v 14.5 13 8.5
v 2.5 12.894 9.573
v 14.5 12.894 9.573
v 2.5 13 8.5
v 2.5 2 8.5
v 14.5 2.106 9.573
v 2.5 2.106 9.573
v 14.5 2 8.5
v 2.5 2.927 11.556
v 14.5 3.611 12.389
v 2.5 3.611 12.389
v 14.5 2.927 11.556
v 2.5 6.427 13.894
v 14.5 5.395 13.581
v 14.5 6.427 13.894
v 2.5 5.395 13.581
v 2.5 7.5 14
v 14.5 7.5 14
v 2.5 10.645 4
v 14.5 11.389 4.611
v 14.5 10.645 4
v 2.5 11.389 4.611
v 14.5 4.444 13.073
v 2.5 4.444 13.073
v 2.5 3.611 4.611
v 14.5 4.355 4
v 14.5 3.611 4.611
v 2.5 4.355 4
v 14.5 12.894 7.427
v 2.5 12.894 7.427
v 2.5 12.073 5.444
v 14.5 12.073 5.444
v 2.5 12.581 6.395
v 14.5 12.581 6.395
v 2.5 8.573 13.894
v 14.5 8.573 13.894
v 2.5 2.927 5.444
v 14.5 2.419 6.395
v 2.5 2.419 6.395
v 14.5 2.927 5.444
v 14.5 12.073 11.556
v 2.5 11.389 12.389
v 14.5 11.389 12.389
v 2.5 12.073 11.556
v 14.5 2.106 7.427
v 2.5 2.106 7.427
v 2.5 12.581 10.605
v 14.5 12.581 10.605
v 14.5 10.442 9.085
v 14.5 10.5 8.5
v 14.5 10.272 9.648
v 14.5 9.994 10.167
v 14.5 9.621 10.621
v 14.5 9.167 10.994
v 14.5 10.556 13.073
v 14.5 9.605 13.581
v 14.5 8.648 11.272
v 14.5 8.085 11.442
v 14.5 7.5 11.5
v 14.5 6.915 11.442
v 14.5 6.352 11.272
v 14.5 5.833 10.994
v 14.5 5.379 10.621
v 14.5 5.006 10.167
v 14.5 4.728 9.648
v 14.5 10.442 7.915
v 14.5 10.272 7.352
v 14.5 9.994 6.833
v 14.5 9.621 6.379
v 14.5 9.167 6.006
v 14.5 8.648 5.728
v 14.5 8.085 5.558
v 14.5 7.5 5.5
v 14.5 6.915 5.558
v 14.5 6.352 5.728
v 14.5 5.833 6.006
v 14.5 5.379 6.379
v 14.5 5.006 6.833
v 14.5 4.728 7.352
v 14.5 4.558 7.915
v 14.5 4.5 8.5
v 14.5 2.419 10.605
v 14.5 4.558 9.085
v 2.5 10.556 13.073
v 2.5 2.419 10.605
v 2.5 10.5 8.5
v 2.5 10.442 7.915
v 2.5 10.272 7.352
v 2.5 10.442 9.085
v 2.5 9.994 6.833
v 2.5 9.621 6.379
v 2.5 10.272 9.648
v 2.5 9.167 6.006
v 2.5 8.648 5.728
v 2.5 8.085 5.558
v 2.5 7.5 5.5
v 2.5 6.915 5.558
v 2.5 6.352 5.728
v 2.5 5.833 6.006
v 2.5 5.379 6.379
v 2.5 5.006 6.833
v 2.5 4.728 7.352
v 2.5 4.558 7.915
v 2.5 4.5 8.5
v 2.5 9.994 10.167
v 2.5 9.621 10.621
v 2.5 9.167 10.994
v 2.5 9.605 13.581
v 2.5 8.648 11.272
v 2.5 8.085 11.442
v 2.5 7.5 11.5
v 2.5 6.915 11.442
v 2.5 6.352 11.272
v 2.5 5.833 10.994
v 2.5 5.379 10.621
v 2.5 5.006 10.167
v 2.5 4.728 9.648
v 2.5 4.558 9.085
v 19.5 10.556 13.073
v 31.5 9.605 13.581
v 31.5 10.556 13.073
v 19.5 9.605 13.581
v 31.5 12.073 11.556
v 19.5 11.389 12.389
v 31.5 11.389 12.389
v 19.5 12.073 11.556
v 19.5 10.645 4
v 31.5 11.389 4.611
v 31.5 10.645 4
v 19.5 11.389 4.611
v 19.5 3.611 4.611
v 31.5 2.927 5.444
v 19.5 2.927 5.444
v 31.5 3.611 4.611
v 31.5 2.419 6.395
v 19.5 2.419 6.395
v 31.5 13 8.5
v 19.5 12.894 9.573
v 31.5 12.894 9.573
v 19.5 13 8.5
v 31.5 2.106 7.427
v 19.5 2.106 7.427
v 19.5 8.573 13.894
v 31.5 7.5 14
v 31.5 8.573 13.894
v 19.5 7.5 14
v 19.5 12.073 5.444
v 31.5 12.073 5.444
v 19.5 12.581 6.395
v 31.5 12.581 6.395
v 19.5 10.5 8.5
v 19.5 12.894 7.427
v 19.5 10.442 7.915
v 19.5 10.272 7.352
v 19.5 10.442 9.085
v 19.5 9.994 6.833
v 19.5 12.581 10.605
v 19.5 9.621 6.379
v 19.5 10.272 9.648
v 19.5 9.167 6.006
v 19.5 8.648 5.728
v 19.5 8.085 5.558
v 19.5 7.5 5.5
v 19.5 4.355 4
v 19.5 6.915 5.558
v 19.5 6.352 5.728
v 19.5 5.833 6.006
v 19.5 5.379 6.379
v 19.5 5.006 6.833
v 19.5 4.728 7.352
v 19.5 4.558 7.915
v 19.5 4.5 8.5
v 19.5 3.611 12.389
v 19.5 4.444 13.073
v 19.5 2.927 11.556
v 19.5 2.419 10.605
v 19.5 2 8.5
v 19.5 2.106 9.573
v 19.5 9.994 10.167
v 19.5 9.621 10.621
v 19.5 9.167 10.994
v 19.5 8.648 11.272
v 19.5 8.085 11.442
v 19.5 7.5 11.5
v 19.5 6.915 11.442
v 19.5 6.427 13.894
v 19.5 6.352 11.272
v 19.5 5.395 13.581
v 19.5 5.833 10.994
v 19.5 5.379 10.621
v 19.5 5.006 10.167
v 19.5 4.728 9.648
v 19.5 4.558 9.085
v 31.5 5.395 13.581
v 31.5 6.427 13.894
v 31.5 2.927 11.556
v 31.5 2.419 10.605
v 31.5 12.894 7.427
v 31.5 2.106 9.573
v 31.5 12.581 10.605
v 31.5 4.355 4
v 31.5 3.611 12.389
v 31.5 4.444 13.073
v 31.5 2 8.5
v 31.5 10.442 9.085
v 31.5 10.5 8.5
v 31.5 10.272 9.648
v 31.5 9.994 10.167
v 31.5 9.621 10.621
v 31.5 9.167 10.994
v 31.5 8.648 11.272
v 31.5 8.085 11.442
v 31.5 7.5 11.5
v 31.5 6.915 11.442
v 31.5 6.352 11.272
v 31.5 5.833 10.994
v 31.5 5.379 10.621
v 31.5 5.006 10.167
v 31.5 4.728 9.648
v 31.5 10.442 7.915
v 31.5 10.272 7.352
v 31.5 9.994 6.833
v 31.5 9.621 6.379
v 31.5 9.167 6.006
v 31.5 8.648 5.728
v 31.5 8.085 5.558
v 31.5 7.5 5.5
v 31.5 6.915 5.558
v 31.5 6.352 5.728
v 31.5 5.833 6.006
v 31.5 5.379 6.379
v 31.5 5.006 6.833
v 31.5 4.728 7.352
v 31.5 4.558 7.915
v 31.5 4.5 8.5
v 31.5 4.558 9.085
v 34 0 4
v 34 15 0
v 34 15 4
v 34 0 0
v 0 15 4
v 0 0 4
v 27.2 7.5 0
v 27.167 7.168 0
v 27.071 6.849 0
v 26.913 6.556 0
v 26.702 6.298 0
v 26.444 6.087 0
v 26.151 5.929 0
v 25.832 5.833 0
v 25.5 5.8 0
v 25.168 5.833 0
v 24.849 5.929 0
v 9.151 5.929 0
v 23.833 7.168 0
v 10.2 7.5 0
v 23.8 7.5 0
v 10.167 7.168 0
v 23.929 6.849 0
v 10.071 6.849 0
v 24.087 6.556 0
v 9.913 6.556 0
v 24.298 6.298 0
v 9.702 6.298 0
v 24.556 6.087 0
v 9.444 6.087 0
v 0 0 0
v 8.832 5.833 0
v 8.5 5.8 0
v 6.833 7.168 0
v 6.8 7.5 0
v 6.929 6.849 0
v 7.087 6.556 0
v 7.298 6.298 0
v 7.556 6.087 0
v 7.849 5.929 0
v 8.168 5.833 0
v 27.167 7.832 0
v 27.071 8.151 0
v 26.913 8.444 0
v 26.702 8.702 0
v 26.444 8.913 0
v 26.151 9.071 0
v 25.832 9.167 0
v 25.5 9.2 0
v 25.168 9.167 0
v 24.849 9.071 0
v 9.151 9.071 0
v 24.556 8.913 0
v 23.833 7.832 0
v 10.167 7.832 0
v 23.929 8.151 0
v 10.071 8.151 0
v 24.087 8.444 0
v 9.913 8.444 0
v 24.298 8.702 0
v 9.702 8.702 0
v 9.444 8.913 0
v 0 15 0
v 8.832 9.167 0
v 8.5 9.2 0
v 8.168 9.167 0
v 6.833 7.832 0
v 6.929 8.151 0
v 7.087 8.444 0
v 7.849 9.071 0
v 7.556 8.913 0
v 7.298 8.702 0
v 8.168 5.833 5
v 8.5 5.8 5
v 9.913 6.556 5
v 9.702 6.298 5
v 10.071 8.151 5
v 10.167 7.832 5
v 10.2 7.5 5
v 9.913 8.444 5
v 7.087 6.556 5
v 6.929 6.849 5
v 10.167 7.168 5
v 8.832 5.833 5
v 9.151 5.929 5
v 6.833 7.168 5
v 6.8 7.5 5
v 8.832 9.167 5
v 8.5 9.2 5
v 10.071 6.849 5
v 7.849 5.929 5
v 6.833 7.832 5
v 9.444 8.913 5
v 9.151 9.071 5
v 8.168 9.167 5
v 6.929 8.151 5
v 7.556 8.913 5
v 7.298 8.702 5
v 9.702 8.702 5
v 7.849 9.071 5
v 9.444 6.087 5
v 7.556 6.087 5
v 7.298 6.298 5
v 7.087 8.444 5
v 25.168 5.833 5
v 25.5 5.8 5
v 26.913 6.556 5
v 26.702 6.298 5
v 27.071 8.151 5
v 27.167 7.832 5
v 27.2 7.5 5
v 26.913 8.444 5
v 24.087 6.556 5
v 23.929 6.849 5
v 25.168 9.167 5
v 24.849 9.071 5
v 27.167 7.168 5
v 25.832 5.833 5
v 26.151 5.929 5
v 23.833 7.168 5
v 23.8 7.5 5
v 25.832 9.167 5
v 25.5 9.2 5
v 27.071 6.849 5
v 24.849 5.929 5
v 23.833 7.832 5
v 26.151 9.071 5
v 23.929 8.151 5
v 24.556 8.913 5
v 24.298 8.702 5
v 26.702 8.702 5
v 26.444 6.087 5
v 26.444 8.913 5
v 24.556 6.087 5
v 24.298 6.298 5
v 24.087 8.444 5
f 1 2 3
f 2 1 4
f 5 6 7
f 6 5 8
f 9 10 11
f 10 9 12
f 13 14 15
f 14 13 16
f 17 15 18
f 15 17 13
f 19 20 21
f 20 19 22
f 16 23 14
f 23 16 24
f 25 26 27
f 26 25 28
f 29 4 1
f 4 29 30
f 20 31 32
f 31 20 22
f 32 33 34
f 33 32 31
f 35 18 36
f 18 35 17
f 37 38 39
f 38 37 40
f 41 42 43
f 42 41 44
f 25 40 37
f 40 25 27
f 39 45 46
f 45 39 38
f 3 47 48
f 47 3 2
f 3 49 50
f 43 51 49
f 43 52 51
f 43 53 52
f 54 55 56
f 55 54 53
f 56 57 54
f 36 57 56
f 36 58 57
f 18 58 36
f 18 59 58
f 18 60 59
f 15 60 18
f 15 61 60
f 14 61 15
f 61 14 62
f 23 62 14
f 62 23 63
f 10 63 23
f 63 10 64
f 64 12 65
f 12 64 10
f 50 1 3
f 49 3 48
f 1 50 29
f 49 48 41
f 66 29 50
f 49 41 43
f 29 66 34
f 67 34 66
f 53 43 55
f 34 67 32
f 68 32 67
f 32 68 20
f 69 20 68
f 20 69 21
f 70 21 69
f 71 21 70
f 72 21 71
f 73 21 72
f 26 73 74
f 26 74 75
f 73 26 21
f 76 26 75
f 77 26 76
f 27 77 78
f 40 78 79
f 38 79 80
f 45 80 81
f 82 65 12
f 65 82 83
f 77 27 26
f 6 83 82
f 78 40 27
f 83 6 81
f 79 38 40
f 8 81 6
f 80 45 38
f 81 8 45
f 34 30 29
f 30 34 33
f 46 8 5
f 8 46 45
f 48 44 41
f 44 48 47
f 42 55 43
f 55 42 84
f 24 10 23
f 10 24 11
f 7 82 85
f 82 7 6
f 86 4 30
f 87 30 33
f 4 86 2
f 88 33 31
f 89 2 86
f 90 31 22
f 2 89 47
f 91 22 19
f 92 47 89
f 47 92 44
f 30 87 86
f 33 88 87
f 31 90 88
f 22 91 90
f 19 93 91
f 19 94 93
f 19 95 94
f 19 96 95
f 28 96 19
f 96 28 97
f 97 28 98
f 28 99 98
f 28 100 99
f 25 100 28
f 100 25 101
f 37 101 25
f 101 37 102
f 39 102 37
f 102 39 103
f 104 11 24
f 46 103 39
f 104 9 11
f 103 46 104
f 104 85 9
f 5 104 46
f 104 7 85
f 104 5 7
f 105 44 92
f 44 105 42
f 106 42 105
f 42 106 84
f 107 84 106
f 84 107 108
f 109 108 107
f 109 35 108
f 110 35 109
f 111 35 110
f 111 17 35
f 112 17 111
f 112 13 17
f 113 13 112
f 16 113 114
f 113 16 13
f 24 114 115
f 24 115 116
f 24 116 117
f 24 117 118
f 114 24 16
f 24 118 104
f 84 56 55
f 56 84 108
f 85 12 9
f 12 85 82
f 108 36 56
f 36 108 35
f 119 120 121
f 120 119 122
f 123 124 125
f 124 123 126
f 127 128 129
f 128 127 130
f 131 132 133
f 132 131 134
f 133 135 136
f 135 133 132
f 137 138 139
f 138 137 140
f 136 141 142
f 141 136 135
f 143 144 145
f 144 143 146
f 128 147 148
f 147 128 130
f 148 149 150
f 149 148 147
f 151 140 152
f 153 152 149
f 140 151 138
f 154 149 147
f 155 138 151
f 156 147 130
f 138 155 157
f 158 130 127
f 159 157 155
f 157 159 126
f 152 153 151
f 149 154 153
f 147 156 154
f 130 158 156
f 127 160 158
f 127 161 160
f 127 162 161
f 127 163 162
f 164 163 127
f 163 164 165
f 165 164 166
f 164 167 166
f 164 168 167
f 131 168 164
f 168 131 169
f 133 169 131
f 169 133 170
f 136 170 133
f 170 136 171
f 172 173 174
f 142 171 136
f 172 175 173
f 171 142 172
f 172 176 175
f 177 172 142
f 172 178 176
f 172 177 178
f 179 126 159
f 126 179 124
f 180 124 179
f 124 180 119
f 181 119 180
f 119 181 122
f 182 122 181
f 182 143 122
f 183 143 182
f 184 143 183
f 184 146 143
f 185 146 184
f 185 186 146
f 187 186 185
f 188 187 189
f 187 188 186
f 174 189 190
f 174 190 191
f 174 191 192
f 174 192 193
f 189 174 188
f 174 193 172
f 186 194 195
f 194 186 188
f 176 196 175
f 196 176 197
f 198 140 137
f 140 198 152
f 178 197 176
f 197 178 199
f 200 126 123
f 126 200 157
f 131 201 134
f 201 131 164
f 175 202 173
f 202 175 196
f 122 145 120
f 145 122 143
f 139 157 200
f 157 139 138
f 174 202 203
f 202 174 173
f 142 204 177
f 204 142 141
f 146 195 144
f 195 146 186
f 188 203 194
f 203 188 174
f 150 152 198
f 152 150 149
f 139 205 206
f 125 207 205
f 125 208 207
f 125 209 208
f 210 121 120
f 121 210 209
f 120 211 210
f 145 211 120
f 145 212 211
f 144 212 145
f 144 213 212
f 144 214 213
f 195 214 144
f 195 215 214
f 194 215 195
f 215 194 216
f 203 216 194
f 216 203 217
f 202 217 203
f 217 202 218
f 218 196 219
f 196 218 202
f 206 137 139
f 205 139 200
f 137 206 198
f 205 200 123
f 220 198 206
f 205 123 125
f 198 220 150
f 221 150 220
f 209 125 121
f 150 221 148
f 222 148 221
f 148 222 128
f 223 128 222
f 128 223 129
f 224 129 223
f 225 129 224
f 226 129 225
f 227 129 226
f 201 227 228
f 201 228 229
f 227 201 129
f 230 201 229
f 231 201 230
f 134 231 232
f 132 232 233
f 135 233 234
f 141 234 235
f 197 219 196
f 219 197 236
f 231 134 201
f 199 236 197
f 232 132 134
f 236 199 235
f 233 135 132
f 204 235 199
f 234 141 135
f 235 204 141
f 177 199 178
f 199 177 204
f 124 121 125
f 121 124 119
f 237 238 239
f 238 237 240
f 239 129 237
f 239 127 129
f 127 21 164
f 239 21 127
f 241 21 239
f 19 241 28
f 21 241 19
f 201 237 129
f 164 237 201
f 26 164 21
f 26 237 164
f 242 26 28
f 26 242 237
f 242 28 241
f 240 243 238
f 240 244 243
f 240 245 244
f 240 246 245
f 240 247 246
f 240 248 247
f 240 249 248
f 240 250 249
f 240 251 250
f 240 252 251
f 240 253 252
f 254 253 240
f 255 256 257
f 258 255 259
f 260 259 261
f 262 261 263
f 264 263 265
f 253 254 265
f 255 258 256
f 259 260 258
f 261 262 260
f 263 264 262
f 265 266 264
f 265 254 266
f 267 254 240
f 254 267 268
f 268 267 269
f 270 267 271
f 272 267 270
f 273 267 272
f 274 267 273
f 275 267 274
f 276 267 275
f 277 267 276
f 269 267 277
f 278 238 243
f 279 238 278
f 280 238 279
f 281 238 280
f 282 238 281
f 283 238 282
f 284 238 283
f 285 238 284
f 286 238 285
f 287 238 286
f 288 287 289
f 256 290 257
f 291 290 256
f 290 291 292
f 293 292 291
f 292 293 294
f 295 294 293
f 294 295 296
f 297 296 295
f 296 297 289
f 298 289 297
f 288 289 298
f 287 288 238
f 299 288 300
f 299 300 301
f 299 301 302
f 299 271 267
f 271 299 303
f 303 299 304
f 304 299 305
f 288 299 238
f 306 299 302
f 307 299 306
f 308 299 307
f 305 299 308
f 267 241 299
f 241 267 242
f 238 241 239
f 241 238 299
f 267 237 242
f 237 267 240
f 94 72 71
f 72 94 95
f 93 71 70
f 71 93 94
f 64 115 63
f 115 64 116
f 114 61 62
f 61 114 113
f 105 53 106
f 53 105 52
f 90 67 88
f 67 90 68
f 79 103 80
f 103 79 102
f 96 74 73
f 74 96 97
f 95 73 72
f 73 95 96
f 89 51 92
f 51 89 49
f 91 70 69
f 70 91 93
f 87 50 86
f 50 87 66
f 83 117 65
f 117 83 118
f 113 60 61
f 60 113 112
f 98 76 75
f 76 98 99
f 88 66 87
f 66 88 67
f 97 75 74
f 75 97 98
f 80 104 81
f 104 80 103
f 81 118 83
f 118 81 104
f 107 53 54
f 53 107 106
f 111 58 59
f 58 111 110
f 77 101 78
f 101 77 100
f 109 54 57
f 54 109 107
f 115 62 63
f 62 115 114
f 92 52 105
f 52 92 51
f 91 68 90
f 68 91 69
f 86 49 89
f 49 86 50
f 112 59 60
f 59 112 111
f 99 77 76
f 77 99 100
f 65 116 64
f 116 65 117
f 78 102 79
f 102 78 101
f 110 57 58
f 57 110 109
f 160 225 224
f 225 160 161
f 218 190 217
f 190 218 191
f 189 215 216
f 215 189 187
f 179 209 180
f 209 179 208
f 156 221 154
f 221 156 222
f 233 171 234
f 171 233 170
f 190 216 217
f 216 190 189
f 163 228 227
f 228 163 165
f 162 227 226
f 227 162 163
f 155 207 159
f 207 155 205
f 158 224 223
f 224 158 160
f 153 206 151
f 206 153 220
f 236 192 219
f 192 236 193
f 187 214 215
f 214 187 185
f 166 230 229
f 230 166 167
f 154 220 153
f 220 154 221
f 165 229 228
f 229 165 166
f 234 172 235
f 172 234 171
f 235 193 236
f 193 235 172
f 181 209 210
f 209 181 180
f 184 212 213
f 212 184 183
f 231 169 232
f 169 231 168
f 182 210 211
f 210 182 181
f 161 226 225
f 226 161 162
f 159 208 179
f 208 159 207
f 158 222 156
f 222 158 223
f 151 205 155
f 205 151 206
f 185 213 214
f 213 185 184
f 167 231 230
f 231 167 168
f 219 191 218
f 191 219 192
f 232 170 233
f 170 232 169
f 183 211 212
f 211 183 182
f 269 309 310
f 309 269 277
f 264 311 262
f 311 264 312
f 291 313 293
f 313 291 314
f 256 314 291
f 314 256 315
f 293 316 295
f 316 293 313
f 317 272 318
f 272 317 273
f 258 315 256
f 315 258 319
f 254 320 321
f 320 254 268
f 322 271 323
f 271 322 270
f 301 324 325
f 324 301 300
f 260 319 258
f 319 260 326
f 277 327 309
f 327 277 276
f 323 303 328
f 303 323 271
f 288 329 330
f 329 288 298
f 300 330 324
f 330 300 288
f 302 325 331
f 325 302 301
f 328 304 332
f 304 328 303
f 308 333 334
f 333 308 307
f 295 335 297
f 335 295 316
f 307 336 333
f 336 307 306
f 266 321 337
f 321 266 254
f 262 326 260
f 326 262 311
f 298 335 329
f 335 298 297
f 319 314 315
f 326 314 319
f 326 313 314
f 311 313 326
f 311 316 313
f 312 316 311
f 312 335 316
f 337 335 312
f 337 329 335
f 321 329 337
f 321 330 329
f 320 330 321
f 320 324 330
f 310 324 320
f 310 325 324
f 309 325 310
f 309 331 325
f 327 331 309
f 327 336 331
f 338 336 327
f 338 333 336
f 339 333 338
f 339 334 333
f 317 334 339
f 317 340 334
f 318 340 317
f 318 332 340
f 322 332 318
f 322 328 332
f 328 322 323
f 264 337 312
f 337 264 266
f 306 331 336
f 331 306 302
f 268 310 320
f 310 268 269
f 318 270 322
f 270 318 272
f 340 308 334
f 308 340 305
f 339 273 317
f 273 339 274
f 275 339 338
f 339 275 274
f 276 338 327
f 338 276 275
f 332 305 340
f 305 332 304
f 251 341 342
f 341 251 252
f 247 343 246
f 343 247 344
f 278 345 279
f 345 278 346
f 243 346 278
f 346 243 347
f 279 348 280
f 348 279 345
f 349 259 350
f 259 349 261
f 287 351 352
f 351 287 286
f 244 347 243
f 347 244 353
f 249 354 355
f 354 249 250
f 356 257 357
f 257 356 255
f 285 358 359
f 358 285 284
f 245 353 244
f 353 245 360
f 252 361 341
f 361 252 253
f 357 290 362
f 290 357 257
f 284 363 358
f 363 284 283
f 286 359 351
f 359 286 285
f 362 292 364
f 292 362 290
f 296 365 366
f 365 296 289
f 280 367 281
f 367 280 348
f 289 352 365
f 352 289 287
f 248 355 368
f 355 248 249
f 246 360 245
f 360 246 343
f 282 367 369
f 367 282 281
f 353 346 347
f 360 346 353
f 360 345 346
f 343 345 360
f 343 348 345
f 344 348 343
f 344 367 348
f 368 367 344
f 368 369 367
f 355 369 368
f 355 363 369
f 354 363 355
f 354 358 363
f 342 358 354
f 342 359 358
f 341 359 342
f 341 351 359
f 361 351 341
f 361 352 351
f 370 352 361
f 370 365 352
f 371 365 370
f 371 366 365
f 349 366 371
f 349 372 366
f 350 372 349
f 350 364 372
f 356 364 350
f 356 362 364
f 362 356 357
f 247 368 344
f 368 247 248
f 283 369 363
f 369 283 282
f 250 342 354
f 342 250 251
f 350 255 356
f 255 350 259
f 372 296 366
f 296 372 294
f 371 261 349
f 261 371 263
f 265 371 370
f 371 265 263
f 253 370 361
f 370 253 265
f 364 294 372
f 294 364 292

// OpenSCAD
$fn = 32;

// ----------------------------------------------------------------------
// Cable clip: cable 6 mm, clamp 11 mm, base 34 mm
// ----------------------------------------------------------------------

// --- parameters (mm) ---
foot_w = 34;              // base length, X
foot_d = 15;              // base width, Y
foot_t = 4;               // base thickness
hose_seat_d = 11;         // clamp outside diameter
ring_t = 2.5;             // clamp wall
cable_d = 6;              // cable opening
ring_w = 12;              // clamp width along the cable
screw_d = 3.4;            // screw clearance
sink = 1;                 // overlap of the clamp into the base
pitch = 17;               // distance between the two clamps

module base() {
  cube([foot_w, foot_d, foot_t]);
}

module clamps() {
  for (sx = [-1, 1])
    translate([foot_w / 2 + sx * pitch / 2, foot_d / 2, foot_t + hose_seat_d / 2 - sink]) rotate([0, 90, 0])
      cylinder(h = ring_w, d = hose_seat_d, center = true);
}

difference() {
  union() {
    base();
    clamps();
  }
  for (sx = [-1, 1])
    translate([foot_w / 2 + sx * pitch / 2, foot_d / 2, foot_t + hose_seat_d / 2 - sink]) rotate([0, 90, 0]) translate([0, 0, -ring_w / 2 - 1]) cylinder(h = ring_w + 2, d = cable_d);
  translate([8.5, foot_d / 2, -1]) cylinder(h = foot_t + 2, d = screw_d);
  translate([25.5, foot_d / 2, -1]) cylinder(h = foot_t + 2, d = screw_d);
}
